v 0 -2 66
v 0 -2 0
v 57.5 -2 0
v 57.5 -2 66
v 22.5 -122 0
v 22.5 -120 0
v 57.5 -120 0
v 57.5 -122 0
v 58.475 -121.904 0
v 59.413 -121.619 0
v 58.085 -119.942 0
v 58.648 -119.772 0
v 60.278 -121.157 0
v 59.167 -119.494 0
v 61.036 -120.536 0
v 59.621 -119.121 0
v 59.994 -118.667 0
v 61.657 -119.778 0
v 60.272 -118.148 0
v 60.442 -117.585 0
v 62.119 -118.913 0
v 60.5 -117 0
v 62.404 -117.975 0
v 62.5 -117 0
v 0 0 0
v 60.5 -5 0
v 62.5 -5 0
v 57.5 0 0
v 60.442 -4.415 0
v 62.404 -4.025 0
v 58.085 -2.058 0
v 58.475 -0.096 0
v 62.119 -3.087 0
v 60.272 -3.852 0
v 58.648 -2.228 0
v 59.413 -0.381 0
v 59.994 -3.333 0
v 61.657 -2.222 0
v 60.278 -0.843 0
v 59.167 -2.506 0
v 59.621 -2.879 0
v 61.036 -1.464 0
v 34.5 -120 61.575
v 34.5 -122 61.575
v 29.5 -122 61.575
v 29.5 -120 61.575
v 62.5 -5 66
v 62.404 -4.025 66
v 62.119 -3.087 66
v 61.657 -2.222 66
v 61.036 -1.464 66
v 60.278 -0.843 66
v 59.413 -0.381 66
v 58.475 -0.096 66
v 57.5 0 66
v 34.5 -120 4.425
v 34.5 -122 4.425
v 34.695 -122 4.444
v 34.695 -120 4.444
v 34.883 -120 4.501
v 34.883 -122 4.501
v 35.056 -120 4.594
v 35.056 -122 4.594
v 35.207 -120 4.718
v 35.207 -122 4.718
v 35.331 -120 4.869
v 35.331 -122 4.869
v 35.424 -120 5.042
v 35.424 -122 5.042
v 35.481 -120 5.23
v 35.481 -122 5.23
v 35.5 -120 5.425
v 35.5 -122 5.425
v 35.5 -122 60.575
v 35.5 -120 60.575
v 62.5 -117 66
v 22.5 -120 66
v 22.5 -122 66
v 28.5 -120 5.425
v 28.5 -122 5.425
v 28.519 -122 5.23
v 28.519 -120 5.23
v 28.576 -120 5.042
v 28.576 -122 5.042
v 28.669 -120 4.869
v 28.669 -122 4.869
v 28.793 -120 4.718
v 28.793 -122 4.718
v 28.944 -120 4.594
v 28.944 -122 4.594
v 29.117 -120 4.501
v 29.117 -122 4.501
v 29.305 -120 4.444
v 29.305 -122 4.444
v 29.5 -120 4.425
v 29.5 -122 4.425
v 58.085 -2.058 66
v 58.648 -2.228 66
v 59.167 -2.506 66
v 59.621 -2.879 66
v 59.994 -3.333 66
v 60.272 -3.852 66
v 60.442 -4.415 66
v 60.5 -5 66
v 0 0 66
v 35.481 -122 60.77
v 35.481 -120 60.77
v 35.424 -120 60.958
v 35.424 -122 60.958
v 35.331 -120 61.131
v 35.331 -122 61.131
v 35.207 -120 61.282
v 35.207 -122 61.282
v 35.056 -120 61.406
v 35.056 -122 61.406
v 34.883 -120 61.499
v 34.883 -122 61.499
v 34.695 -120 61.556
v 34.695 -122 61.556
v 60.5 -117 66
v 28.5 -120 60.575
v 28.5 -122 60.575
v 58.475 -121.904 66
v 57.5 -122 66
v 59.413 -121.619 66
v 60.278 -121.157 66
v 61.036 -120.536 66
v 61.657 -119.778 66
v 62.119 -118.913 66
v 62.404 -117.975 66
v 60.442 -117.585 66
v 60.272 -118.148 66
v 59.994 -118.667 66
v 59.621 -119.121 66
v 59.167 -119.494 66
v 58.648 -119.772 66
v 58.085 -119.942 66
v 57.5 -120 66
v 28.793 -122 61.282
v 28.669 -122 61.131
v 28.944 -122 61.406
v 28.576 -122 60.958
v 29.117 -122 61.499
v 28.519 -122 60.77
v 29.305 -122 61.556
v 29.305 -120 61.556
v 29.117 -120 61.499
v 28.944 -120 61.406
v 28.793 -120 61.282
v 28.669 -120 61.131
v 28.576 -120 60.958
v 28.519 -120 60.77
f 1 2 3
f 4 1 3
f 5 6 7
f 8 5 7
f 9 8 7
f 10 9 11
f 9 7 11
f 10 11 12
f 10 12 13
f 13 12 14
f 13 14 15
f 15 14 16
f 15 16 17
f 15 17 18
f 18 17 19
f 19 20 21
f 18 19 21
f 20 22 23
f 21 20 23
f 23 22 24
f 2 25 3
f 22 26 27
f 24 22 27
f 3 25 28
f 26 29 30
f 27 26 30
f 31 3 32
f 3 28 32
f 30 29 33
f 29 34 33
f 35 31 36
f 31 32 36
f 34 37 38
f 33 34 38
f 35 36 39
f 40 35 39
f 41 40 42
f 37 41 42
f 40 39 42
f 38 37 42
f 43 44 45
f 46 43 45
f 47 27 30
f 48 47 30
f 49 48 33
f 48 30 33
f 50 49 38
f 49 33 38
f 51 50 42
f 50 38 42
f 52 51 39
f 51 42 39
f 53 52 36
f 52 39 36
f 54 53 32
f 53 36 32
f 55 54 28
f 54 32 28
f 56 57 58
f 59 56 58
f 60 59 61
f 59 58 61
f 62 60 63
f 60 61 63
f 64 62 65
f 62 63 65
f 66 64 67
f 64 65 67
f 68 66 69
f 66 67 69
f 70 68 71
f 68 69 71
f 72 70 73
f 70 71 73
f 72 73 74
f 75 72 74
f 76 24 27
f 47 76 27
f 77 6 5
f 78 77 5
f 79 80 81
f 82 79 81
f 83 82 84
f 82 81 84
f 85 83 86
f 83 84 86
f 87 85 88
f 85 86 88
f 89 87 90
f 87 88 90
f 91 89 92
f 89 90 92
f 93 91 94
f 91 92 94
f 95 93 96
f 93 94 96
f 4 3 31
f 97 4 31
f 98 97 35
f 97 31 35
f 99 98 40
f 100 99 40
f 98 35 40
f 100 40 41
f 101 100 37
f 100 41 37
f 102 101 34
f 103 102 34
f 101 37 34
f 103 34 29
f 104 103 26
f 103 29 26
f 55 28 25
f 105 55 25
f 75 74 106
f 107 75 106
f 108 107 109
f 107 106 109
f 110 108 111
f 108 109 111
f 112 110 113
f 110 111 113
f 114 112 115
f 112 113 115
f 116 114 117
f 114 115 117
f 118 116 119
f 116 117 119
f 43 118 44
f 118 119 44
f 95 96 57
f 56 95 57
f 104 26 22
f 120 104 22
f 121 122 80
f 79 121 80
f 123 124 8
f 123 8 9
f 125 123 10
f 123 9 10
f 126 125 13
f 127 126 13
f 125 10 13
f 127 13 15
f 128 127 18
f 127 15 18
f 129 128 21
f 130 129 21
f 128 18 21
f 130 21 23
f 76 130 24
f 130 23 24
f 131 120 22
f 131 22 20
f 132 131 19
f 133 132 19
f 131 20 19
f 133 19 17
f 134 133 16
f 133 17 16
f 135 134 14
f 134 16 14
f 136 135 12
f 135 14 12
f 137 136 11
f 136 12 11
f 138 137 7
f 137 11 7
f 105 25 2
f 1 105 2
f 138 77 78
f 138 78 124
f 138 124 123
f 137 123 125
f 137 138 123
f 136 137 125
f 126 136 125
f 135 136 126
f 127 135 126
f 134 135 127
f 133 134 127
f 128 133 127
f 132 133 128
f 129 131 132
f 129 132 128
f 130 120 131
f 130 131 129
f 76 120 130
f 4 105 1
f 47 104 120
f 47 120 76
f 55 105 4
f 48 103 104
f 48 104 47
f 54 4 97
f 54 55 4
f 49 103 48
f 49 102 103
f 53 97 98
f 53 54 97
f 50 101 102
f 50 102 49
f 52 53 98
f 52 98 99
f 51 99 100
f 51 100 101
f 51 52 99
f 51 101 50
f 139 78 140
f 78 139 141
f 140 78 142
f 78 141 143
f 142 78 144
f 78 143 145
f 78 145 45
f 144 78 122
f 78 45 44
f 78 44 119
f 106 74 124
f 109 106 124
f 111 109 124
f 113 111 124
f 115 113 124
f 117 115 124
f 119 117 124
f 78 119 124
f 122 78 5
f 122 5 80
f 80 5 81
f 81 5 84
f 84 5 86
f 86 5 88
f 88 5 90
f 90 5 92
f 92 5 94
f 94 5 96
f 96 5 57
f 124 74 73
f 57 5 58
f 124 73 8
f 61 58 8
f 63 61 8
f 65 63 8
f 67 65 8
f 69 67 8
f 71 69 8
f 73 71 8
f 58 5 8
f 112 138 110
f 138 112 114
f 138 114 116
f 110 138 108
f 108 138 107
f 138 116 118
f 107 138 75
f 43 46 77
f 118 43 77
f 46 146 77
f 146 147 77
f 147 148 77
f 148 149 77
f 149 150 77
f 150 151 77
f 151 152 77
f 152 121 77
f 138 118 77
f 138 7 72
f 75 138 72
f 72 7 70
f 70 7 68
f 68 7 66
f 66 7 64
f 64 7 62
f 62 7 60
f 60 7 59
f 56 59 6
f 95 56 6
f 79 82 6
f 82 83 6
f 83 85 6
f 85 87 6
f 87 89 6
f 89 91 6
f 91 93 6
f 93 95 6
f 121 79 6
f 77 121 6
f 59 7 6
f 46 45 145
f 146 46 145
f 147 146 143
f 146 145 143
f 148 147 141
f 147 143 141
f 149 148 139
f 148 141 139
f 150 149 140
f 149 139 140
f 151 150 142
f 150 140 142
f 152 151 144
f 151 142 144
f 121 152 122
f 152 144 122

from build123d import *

# Parameters (mm, degrees)
F1_DEPTH = 66
F3_DEPTH = 25


with BuildPart() as f1:
    # F0 (on Top) → F1 (new body)
    with BuildSketch(Plane.XY):
        with BuildLine():
            Line((57.5, 0), (0, 0))
            Line((0, 0), (0, -2))
            Line((0, -2), (57.5, -2))
            ThreePointArc((57.5, -2), (59.62132, -2.87868), (60.5, -5))
            Line((60.5, -5), (60.5, -117))
            ThreePointArc((60.5, -117), (59.62132, -119.12132), (57.5, -120))
            Line((57.5, -120), (22.5, -120))
            Line((22.5, -120), (22.5, -122))
            Line((22.5, -122), (57.5, -122))
            ThreePointArc((57.5, -122), (61.035534, -120.535534), (62.5, -117))
            Line((62.5, -117), (62.5, -5))
            ThreePointArc((62.5, -5), (61.035534, -1.464466), (57.5, 0))
        make_face()
    extrude(amount=F1_DEPTH)

    # F2 (on face) → F3 (cut)
    with BuildSketch(Plane.XZ.offset(122)):
        with BuildLine():
            Line((34.5, 61.575), (29.5, 61.575))
            ThreePointArc((29.5, 61.575), (28.792893, 61.282107), (28.5, 60.575))
            Line((28.5, 60.575), (28.5, 5.425))
            ThreePointArc((28.5, 5.425), (28.792893, 4.717893), (29.5, 4.425))
            Line((29.5, 4.425), (34.5, 4.425))
            ThreePointArc((34.5, 4.425), (35.207107, 4.717893), (35.5, 5.425))
            Line((35.5, 5.425), (35.5, 60.575))
            ThreePointArc((35.5, 60.575), (35.207107, 61.282107), (34.5, 61.575))
        make_face()
    extrude(amount=-F3_DEPTH, mode=Mode.SUBTRACT)


solid = f1.part
